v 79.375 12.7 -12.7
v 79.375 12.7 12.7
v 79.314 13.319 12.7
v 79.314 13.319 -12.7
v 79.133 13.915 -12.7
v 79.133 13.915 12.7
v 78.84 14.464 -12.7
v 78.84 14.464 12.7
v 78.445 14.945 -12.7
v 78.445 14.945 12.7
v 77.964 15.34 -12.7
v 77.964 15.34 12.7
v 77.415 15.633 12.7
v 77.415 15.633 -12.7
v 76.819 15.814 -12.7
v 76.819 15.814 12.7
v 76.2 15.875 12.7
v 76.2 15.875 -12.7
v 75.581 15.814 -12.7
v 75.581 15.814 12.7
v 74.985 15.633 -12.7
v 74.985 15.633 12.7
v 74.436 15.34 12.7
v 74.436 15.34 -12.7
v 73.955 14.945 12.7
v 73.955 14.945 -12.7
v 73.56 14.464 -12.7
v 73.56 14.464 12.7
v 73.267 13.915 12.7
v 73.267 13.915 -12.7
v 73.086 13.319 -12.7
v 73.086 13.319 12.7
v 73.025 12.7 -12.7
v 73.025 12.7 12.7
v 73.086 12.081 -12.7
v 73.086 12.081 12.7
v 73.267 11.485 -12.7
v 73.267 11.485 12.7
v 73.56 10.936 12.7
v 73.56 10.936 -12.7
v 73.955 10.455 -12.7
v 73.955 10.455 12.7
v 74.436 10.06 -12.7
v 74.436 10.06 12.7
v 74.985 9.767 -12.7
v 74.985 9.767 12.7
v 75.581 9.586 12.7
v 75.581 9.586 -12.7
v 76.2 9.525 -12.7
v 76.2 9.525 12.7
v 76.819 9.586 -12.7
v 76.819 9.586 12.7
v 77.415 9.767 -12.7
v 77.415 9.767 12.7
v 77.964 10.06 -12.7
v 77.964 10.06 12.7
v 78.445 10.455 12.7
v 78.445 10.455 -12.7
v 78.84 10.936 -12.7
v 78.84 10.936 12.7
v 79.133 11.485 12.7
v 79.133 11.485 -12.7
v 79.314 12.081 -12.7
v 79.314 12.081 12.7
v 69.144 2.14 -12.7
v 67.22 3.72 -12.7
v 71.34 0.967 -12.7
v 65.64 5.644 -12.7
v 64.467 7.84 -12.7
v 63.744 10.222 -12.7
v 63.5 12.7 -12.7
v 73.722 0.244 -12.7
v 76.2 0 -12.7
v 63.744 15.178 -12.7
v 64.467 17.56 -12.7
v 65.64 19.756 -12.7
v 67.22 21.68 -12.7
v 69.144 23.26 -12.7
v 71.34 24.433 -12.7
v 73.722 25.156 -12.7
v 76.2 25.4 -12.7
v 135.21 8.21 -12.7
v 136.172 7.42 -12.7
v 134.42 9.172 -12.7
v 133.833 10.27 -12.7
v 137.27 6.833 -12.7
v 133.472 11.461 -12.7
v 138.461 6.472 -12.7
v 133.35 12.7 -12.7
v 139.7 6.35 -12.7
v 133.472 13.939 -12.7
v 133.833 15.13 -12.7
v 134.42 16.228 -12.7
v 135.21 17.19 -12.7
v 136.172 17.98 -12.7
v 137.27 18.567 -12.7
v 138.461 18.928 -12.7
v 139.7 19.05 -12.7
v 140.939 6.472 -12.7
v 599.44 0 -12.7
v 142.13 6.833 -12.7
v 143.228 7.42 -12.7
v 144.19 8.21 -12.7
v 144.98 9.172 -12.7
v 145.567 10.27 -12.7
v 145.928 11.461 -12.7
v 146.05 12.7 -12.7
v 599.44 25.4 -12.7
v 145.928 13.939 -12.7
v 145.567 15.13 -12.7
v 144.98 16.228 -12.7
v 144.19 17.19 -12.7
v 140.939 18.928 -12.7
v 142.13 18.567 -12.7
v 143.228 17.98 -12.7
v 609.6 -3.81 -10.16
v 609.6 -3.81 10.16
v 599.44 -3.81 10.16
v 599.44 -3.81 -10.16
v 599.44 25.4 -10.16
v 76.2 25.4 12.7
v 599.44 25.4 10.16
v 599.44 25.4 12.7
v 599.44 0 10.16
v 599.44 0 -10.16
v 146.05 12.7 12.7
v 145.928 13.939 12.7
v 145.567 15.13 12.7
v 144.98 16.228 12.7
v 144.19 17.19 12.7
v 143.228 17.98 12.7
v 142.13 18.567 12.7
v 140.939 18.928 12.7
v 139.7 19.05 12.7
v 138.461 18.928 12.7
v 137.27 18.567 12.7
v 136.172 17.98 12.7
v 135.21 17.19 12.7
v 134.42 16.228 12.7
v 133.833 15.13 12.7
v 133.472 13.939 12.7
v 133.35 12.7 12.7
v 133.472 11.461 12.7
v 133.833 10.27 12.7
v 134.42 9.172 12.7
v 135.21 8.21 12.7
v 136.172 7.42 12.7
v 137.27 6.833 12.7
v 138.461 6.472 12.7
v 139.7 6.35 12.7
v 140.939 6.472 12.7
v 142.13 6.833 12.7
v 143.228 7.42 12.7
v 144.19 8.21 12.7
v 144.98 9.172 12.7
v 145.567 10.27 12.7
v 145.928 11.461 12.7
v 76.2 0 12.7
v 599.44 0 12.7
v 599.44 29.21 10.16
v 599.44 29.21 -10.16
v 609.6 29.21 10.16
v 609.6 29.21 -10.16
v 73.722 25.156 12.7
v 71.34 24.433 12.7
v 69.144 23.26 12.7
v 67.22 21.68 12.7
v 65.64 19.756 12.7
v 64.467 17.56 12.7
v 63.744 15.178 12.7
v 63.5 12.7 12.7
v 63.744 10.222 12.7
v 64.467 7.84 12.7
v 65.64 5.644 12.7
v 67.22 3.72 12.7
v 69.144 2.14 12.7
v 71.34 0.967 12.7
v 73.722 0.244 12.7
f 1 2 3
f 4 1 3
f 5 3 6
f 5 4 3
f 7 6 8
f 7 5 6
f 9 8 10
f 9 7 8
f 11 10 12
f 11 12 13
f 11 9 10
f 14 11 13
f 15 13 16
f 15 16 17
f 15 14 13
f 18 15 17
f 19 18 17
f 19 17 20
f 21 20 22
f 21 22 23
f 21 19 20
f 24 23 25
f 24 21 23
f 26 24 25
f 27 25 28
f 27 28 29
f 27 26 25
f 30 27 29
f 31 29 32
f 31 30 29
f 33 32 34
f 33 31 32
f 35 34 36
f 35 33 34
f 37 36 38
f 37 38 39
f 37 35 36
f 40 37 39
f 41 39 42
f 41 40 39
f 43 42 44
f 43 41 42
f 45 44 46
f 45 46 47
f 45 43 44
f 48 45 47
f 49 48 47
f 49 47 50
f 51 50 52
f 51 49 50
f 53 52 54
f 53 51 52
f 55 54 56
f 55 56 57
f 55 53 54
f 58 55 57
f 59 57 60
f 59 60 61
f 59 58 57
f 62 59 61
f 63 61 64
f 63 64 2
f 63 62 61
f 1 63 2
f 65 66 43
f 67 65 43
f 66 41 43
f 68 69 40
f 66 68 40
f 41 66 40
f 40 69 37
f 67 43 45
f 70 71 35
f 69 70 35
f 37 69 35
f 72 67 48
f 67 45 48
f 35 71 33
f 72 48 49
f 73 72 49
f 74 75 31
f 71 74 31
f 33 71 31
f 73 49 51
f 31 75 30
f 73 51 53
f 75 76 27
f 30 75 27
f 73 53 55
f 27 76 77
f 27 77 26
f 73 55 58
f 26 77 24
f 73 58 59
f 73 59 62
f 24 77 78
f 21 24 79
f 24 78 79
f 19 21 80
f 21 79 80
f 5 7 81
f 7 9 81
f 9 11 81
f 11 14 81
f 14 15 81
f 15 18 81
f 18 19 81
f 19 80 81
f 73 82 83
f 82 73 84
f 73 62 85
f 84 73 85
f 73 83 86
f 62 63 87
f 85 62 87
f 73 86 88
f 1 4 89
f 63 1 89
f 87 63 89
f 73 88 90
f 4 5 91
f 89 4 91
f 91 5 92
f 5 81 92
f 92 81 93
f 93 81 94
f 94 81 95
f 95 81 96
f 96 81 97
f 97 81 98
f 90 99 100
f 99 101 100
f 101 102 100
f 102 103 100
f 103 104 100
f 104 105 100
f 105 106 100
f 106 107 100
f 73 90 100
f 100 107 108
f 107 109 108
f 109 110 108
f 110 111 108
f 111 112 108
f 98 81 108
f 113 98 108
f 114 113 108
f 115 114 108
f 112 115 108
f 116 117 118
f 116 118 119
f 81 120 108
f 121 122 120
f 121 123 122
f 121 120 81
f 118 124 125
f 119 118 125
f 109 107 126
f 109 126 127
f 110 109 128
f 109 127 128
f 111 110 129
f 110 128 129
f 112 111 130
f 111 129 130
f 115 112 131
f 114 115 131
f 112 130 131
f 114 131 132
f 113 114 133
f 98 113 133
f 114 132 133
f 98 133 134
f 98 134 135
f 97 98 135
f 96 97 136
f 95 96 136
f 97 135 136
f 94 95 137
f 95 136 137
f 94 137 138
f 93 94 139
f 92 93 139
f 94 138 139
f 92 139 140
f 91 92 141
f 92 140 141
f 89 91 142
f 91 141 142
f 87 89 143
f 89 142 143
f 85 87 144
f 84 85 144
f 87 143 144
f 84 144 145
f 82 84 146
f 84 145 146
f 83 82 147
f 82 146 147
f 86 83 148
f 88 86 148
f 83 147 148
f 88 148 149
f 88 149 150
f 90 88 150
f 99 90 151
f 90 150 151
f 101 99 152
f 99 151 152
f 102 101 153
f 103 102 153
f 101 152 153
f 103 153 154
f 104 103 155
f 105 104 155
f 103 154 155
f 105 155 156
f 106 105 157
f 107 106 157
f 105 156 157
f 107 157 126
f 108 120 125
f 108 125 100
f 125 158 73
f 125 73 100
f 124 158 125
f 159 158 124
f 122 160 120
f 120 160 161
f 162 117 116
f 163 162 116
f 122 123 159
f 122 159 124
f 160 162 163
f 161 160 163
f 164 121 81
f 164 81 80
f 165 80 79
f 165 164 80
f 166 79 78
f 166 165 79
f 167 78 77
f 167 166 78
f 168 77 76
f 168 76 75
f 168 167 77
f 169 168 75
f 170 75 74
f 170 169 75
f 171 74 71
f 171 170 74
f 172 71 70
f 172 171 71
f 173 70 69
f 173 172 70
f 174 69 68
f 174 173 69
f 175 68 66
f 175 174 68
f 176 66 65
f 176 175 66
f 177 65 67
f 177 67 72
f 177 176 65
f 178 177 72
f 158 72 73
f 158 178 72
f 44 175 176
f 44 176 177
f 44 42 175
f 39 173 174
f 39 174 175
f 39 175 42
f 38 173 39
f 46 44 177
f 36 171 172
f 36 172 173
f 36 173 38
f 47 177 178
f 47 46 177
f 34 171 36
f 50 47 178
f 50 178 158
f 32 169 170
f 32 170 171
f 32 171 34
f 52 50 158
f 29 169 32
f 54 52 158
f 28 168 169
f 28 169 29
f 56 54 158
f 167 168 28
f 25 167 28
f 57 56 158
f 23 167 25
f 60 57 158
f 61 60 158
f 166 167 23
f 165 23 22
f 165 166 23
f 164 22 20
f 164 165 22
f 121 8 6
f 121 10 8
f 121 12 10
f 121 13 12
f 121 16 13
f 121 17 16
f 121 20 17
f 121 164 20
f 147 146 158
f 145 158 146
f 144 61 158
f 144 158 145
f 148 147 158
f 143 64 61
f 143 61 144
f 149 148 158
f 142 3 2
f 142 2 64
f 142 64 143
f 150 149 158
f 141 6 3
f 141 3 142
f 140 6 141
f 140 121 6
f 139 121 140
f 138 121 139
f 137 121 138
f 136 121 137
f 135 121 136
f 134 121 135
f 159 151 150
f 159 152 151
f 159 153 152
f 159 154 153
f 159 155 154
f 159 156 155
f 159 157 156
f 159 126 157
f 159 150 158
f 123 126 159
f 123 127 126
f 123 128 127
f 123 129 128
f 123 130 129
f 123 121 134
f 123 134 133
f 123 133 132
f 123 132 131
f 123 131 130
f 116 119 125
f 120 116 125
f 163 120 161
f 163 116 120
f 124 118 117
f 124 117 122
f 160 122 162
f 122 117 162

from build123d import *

# Parameters (mm, degrees)
BOSS_EXTRUDE1_DEPTH = 12.7
SKETCH1_10_R        = 3.175
SKETCH1_10_R_2      = 6.35
CUT_EXTRUDE3_DEPTH  = 12.7
SKETCH2_W           = 2.54
SKETCH2_H           = 25.4
CUT_EXTRUDE4_DEPTH  = 10.16
SKETCH2_3_W         = 20.32
SKETCH2_3_H         = 3.81
BOSS_EXTRUDE2_DEPTH = 10.16


with BuildPart() as part:
    # Sketch1 → Boss-Extrude1 (new, symmetric)
    with BuildSketch(Plane.XY):
        with BuildLine():
            Line((609.6, 0), (609.6, 25.4))
            Line((609.6, 25.4), (76.2, 25.4))
            ThreePointArc((76.2, 25.4), (63.5, 12.7), (76.2, 0))
            Line((76.2, 0), (609.6, 0))
        make_face()
    extrude(amount=BOSS_EXTRUDE1_DEPTH, both=True)

    # Sketch1<10> → Cut-Extrude3 (cut, symmetric)
    with BuildSketch(Plane.XY):
        with Locations((76.2, 12.7)):
            Circle(SKETCH1_10_R)
        with Locations((139.699994312, 12.7)):
            Circle(SKETCH1_10_R_2)
    extrude(amount=CUT_EXTRUDE3_DEPTH, both=True, mode=Mode.SUBTRACT)

    # Sketch2 → Cut-Extrude4 (cut)
    with BuildSketch(Plane(origin=(609.6, 0, 0), x_dir=(0, 0, -1), z_dir=(1, 0, 0))):
        with Locations((-11.43, 12.7)):
            Rectangle(SKETCH2_W, SKETCH2_H)
        with Locations((11.43, 12.7)):
            Rectangle(SKETCH2_W, SKETCH2_H)
    extrude(amount=-CUT_EXTRUDE4_DEPTH, mode=Mode.SUBTRACT)

    # Sketch2<3> → Boss-Extrude2 (add)
    with BuildSketch(Plane(origin=(609.6, 0, 0), x_dir=(0, 0, -1), z_dir=(1, 0, 0))):
        with Locations((0, 27.305)):
            Rectangle(SKETCH2_3_W, SKETCH2_3_H)
        with Locations((0, -1.905)):
            Rectangle(SKETCH2_3_W, SKETCH2_3_H)
    extrude(amount=-BOSS_EXTRUDE2_DEPTH)


solid = part.part
